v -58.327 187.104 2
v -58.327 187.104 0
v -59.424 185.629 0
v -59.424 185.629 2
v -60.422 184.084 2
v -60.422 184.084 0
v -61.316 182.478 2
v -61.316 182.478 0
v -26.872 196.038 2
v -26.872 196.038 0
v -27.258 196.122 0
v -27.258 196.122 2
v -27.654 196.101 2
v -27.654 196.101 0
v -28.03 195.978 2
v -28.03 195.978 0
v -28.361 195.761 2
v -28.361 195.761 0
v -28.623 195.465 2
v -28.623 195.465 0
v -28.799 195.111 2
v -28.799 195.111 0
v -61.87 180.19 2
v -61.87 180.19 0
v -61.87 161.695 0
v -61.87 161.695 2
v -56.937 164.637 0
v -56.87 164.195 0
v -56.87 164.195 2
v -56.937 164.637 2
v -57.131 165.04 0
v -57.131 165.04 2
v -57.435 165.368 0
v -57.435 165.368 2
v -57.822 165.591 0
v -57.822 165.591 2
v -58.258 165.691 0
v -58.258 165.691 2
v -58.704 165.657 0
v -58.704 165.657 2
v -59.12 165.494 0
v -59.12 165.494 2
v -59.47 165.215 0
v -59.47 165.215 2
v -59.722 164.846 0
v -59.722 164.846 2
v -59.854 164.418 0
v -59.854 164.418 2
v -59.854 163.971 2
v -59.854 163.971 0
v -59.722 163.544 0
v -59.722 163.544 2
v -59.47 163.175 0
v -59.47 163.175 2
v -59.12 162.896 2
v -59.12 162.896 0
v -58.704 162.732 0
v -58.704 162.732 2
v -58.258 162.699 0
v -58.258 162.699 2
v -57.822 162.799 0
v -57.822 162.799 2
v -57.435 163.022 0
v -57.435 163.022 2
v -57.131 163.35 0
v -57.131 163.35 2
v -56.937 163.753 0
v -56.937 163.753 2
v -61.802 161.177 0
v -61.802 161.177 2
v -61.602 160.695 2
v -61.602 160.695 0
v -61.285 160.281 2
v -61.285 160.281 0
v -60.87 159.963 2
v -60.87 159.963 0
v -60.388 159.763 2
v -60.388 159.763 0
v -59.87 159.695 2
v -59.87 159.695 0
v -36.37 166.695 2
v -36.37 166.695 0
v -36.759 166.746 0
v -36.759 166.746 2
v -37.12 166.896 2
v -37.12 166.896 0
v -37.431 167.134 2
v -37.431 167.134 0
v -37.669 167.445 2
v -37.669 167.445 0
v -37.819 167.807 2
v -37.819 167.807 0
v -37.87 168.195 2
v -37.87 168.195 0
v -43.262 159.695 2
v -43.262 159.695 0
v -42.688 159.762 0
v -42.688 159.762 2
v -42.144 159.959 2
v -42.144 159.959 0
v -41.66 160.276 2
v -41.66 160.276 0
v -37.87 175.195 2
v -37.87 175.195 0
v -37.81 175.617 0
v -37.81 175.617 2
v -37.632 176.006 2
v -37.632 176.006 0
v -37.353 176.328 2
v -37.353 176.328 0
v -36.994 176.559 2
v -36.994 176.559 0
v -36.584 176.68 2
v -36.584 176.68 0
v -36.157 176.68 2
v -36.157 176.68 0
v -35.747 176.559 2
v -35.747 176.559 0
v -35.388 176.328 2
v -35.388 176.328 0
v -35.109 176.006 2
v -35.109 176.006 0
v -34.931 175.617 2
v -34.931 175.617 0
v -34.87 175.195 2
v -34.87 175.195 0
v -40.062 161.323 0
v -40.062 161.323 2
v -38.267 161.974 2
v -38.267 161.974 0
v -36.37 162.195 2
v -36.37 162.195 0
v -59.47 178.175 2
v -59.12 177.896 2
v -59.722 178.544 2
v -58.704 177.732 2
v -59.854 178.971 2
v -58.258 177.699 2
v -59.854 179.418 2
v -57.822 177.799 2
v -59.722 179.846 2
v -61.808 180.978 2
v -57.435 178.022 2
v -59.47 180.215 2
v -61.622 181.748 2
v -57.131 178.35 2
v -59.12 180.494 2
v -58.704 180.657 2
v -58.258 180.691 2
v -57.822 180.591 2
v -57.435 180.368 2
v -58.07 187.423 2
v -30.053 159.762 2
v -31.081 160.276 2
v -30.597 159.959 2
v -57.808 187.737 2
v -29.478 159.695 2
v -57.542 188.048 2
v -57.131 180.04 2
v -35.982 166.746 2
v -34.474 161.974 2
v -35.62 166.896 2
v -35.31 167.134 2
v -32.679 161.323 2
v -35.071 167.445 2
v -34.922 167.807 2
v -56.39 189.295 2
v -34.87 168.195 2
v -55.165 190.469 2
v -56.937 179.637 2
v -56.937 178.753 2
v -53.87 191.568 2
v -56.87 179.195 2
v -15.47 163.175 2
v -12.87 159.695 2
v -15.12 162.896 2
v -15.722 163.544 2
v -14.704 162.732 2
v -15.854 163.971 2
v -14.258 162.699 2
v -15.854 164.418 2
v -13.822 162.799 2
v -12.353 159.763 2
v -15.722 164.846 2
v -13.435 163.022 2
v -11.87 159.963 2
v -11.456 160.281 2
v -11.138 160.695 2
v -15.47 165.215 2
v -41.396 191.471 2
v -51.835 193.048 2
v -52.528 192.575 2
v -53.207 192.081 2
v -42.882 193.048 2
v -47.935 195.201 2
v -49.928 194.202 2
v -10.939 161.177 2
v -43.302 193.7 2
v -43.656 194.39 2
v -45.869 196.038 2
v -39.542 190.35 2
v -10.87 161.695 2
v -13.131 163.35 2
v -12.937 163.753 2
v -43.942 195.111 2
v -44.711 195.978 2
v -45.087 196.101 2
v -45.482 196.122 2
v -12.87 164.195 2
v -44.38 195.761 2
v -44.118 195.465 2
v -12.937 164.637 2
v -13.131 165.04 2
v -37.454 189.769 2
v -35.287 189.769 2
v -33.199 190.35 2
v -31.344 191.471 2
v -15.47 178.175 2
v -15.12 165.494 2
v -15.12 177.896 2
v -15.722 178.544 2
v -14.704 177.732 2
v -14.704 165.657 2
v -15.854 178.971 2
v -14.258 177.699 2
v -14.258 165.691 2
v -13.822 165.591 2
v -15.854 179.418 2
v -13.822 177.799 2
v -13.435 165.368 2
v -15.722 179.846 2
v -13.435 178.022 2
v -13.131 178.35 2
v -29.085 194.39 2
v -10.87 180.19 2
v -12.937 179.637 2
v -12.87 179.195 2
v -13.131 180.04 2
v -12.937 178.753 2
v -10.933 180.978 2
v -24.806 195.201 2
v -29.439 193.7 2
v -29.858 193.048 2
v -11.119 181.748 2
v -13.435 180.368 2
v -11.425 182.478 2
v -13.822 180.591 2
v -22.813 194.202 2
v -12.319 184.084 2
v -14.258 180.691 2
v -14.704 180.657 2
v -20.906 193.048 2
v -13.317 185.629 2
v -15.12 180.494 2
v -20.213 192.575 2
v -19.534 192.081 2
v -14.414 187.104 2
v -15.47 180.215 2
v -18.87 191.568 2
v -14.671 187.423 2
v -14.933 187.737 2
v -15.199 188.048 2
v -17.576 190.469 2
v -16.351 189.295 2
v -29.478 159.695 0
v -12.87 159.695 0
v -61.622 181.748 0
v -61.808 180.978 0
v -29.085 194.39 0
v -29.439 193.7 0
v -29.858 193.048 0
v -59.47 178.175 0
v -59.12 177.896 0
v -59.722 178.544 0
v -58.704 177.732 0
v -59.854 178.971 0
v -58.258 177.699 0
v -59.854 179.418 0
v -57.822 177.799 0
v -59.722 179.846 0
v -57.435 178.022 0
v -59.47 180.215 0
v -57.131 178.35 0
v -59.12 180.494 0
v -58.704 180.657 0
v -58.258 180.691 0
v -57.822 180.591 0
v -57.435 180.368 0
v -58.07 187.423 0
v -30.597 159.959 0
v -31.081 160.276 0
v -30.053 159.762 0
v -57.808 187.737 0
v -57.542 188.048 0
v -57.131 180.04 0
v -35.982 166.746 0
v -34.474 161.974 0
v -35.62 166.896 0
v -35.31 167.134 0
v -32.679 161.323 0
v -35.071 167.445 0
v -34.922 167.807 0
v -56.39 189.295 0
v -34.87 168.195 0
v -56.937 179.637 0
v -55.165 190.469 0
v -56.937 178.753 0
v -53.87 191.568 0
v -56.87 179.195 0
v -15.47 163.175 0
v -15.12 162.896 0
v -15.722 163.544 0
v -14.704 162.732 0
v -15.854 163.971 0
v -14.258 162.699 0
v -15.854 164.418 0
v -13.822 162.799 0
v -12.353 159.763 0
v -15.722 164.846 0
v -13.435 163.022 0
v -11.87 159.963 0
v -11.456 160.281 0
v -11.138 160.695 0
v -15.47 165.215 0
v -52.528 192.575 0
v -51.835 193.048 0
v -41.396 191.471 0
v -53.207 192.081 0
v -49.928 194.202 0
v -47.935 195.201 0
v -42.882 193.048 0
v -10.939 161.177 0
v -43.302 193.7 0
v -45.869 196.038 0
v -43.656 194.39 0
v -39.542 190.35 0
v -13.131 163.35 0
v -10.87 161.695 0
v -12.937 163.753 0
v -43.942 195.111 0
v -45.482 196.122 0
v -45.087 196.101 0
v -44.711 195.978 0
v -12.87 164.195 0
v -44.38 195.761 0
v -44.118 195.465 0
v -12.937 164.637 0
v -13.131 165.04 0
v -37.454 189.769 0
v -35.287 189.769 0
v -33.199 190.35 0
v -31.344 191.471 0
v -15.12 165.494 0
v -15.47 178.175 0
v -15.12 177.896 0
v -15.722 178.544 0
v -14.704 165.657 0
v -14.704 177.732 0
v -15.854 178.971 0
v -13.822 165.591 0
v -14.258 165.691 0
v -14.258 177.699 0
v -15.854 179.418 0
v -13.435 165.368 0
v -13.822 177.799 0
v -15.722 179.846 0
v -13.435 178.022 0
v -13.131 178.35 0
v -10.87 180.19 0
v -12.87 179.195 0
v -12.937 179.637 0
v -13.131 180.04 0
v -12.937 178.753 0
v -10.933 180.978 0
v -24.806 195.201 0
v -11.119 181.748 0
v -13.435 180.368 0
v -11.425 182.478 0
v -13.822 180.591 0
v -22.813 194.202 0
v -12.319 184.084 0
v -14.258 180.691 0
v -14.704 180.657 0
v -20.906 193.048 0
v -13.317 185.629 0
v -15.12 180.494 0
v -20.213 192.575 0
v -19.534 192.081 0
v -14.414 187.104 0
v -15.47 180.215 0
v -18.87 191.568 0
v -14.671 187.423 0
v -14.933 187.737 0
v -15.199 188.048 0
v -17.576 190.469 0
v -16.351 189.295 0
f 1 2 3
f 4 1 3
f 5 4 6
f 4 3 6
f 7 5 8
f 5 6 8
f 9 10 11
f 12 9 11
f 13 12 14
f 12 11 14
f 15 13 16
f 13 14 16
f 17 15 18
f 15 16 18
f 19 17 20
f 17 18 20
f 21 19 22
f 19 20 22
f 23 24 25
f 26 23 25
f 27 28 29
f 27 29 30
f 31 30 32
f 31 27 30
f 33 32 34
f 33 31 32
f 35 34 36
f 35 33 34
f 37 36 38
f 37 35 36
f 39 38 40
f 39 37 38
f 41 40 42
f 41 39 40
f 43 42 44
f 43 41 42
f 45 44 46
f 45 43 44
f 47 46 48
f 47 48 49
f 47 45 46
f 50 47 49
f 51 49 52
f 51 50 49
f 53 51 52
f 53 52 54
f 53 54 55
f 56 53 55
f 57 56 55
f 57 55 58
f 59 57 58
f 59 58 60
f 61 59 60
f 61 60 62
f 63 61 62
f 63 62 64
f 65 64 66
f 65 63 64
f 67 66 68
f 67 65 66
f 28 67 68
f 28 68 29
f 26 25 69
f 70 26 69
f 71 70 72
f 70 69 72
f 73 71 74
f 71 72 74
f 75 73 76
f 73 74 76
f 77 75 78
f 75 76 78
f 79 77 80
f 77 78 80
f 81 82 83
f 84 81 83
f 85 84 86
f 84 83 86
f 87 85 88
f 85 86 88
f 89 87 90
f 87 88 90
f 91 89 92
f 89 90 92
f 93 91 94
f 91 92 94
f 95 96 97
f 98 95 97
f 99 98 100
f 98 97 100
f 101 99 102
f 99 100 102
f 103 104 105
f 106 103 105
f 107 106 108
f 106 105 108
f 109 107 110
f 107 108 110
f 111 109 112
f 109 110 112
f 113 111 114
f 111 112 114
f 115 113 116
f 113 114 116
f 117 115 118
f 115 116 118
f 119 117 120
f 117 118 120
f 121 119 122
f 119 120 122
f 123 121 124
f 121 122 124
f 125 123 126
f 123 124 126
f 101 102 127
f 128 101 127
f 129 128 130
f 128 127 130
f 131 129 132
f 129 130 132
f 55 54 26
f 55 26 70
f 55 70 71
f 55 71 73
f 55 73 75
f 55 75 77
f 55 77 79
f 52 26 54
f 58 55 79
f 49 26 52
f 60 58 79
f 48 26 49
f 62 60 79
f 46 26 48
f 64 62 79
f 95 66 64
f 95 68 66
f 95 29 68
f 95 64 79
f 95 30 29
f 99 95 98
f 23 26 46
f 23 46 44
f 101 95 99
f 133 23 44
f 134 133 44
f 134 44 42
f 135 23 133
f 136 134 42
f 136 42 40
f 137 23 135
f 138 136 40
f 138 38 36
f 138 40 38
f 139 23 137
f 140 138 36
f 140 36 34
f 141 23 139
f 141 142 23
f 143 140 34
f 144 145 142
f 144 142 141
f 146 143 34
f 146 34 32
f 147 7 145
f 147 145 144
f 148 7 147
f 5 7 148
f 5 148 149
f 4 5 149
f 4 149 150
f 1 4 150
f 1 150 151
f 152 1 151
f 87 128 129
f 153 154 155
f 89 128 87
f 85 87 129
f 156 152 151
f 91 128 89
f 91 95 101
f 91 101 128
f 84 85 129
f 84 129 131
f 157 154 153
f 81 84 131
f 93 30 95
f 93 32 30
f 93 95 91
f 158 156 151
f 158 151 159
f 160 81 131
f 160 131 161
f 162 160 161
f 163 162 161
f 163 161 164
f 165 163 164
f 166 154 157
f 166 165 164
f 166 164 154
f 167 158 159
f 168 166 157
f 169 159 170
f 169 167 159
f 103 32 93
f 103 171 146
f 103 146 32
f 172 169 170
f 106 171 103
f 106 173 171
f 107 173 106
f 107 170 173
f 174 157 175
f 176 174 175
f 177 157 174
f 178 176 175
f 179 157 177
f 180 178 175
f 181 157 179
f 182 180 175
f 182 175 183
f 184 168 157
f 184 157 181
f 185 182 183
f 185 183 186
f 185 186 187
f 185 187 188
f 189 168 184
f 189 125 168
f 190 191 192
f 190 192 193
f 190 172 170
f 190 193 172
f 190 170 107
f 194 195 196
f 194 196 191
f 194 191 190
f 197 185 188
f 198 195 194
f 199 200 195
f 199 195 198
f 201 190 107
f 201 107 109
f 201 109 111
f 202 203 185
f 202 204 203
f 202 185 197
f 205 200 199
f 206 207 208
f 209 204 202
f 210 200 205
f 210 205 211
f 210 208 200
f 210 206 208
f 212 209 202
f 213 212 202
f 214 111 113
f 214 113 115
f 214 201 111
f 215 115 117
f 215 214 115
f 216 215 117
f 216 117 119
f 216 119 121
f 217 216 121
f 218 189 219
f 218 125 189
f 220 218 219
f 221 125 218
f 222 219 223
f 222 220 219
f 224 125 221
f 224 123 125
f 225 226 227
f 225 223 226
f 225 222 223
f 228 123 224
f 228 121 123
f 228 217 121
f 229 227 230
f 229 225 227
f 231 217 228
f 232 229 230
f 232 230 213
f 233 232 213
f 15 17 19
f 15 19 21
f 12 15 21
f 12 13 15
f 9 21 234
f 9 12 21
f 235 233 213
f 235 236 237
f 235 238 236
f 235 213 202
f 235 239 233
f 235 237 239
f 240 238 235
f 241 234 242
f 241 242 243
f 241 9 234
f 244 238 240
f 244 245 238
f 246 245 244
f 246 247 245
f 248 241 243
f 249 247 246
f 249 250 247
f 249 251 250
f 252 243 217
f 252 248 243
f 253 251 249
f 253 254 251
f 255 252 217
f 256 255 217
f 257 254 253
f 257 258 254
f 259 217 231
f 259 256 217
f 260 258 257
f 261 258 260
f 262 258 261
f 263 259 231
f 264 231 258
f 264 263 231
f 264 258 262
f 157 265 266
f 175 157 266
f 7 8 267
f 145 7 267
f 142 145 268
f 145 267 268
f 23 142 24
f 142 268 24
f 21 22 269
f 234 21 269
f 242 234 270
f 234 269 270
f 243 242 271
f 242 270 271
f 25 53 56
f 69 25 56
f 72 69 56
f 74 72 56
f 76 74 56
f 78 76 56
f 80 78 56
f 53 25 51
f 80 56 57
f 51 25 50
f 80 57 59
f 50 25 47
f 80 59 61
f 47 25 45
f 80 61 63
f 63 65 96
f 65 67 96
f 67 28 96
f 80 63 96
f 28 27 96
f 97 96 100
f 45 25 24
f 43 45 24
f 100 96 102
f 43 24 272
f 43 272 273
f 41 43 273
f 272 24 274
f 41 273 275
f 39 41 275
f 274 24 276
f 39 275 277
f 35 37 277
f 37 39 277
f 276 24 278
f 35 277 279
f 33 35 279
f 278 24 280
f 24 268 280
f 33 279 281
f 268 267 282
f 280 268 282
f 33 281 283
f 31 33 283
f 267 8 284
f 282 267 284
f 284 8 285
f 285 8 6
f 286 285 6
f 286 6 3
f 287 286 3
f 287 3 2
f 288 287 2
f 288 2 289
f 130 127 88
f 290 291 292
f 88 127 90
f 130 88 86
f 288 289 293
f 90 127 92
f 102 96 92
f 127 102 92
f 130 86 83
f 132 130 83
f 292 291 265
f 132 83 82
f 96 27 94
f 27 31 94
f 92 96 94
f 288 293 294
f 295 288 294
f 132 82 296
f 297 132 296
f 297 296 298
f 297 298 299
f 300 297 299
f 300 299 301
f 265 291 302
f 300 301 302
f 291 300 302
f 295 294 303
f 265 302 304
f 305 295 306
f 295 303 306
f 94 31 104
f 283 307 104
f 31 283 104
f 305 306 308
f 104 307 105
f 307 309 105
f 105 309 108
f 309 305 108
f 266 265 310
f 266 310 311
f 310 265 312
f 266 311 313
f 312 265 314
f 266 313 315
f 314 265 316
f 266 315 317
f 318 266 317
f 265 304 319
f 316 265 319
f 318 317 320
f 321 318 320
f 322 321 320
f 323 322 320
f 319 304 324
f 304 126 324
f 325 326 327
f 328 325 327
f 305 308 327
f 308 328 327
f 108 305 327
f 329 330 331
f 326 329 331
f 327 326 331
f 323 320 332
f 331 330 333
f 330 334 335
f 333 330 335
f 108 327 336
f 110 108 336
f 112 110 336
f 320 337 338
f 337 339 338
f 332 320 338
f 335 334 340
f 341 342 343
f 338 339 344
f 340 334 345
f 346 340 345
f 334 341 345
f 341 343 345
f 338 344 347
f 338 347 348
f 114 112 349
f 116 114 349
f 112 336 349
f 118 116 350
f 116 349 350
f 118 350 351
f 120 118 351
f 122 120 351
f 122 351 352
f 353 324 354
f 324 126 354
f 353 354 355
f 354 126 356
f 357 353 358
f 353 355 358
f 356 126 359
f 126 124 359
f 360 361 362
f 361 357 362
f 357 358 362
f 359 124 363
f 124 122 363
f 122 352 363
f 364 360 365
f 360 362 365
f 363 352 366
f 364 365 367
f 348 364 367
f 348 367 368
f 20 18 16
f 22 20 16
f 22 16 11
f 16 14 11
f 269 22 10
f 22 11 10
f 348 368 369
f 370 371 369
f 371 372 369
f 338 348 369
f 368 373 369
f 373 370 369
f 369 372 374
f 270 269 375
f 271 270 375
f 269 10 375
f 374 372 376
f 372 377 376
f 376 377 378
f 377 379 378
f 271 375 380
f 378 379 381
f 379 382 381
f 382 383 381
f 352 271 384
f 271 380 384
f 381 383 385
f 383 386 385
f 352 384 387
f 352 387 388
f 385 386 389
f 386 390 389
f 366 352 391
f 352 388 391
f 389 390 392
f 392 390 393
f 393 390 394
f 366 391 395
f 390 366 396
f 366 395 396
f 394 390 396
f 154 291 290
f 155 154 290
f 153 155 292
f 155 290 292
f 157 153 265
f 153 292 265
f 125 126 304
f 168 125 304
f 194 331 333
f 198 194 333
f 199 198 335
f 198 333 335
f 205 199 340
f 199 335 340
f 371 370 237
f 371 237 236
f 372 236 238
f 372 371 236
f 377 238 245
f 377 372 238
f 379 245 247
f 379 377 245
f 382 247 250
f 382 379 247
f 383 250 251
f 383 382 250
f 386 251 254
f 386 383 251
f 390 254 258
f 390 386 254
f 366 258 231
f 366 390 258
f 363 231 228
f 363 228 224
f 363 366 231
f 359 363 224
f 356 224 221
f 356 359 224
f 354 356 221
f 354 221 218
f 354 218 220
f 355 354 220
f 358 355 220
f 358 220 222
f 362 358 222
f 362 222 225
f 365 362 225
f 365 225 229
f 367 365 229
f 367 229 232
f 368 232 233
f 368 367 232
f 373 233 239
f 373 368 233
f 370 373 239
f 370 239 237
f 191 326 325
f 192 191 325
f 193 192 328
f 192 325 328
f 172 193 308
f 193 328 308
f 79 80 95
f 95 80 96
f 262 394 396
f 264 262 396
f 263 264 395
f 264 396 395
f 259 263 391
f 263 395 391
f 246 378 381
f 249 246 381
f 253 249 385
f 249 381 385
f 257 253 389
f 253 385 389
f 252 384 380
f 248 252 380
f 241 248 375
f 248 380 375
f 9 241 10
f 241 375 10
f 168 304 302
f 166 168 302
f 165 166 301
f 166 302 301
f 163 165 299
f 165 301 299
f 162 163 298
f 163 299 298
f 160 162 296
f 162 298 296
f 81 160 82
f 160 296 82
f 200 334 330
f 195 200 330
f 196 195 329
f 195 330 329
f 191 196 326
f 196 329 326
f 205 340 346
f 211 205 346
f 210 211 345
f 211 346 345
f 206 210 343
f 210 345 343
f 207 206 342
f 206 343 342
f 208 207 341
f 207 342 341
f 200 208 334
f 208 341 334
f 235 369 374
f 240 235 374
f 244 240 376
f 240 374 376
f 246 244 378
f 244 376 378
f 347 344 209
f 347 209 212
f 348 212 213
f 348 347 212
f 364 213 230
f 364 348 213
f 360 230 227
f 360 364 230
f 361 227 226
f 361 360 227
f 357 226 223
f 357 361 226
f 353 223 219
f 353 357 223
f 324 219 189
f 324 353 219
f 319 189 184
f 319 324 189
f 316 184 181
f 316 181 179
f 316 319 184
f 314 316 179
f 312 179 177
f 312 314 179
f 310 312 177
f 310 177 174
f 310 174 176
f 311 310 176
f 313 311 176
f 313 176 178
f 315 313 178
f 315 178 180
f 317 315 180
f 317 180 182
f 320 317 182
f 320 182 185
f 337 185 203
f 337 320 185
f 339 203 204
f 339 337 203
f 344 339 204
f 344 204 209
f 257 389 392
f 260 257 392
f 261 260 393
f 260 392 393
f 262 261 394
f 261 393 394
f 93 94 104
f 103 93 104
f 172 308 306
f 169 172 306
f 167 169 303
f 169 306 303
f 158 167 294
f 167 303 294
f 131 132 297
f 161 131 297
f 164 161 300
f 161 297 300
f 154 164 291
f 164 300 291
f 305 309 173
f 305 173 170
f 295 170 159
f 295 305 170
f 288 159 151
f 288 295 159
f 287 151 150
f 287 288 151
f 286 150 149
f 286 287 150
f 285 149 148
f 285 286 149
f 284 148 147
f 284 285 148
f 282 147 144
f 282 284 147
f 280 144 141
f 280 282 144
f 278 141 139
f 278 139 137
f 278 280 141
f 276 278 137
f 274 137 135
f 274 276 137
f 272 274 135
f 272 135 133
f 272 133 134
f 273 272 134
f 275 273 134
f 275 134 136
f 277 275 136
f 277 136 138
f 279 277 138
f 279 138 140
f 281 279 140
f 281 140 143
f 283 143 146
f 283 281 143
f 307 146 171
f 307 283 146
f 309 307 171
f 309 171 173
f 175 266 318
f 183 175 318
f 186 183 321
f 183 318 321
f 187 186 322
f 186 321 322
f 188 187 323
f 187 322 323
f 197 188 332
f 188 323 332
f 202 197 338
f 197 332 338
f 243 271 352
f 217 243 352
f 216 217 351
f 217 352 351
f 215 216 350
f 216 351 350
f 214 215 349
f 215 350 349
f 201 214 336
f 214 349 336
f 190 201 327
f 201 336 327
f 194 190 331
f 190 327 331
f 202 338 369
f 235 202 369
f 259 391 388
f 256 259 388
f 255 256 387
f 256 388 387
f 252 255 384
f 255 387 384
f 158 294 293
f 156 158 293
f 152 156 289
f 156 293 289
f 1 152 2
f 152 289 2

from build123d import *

# Parameters (mm, degrees)
F0_R     = 1.5
F1_DEPTH = 2


# Not quite as in the source:
# - a feature names something its author has since deleted; it is built from what else it names


with BuildPart() as f1:
    # F0 (on Top) → F1 (new body)
    with BuildSketch(Plane.XY):
        with BuildLine():
            Line((-61.8704294452, 175.1948396463), (-53.8704294452, 175.1948396463))
            Line((-53.8704294452, 175.1948396463), (-53.8704294452, 185.547974161))
            ThreePointArc((-53.8704294452, 185.547974161), (-57.1946545112, 183.1877510697), (-58.3269518777, 187.1042581875))
            ThreePointArc((-58.3269518777, 187.1042581875), (-59.9354051762, 184.8644644288), (-61.3162125777, 182.4775901096))
            ThreePointArc((-61.3162125777, 182.4775901096), (-61.7299003867, 181.366665728), (-61.8704294452, 180.1895751756))
            Line((-61.8704294452, 180.1895751756), (-61.8704294452, 175.1948396463))
        make_face()
        with Locations((-58.3704294452, 179.1948396463)):
            Circle(F0_R, mode=Mode.SUBTRACT)
        with BuildLine():
            ThreePointArc((-58.3269518777, 187.1042581875), (-57.1946545112, 183.1877510697), (-53.8704294452, 185.547974161))
            ThreePointArc((-53.8704294452, 185.547974161), (-54.6026624922, 187.315741114), (-56.3704294452, 188.047974161))
            ThreePointArc((-56.3704294452, 188.047974161), (-57.4565440648, 187.7997190473), (-58.3269518777, 187.1042581875))
        make_face()
        with BuildLine():
            Line((-18.8704294452, 175.1948396463), (-10.8704294452, 175.1948396463))
            Line((-10.8704294452, 175.1948396463), (-10.8704294452, 180.1895751756))
            ThreePointArc((-10.8704294452, 180.1895751756), (-11.0109585037, 181.366665728), (-11.4246463127, 182.4775901096))
            ThreePointArc((-11.4246463127, 182.4775901096), (-12.8054541473, 184.8644650992), (-14.4139080064, 187.1042594368))
            ThreePointArc((-14.4139080064, 187.1042594368), (-14.010206617, 186.3721999805), (-13.8704294452, 185.547974161))
            ThreePointArc((-13.8704294452, 185.547974161), (-16.3704294452, 183.047974161), (-18.8704294452, 185.547974161))
            Line((-18.8704294452, 185.547974161), (-18.8704294452, 175.1948396463))
        make_face()
        with Locations((-14.3704294452, 179.1948396463)):
            Circle(F0_R, mode=Mode.SUBTRACT)
        with BuildLine():
            ThreePointArc((-16.3704294452, 188.047974161), (-18.1381963982, 187.315741114), (-18.8704294452, 185.547974161))
            ThreePointArc((-18.8704294452, 185.547974161), (-16.3704294452, 183.047974161), (-13.8704294452, 185.547974161))
            ThreePointArc((-13.8704294452, 185.547974161), (-14.010206617, 186.3721999805), (-14.4139080064, 187.1042594368))
            ThreePointArc((-14.4139080064, 187.1042594368), (-15.2843155445, 187.7997193941), (-16.3704294452, 188.047974161))
        make_face()
        with BuildLine():
            Line((-36.3704294452, 166.6948396463), (-36.3704294452, 165.1948396463))
            Line((-36.3704294452, 165.1948396463), (-23.8704294452, 165.1948396463))
            ThreePointArc((-23.8704294452, 165.1948396463), (-20.3348955393, 166.6593057403), (-18.8704294452, 170.1948396463))
            Line((-18.8704294452, 170.1948396463), (-18.8704294452, 175.1948396463))
            Line((-18.8704294452, 175.1948396463), (-34.8704294452, 175.1948396463))
            Line((-34.8704294452, 175.1948396463), (-34.8704294452, 168.1948396463))
            ThreePointArc((-34.8704294452, 168.1948396463), (-35.3097692734, 167.1341794745), (-36.3704294452, 166.6948396463))
        make_face()
        with BuildLine():
            Line((-48.8704294452, 165.1948396463), (-36.3704294452, 165.1948396463))
            Line((-36.3704294452, 165.1948396463), (-36.3704294452, 166.6948396463))
            ThreePointArc((-36.3704294452, 166.6948396463), (-37.431089617, 167.1341794745), (-37.8704294452, 168.1948396463))
            Line((-37.8704294452, 168.1948396463), (-37.8704294452, 175.1948396463))
            Line((-37.8704294452, 175.1948396463), (-53.8704294452, 175.1948396463))
            Line((-53.8704294452, 175.1948396463), (-53.8704294452, 170.1948396463))
            ThreePointArc((-53.8704294452, 170.1948396463), (-52.4059633511, 166.6593057403), (-48.8704294452, 165.1948396463))
        make_face()
        with BuildLine():
            Line((-34.8704294452, 175.1948396463), (-18.8704294452, 175.1948396463))
            Line((-18.8704294452, 175.1948396463), (-18.8704294452, 185.547974161))
            Line((-18.8704294452, 185.547974161), (-18.8704294452, 188.047974161))
            Line((-18.8704294452, 188.047974161), (-53.8704294452, 188.047974161))
            Line((-53.8704294452, 188.047974161), (-53.8704294452, 185.547974161))
            Line((-53.8704294452, 185.547974161), (-53.8704294452, 175.1948396463))
            Line((-53.8704294452, 175.1948396463), (-37.8704294452, 175.1948396463))
            ThreePointArc((-37.8704294452, 175.1948396463), (-36.3704294452, 176.6948396463), (-34.8704294452, 175.1948396463))
        make_face()
        with BuildLine():
            ThreePointArc((-41.6596574736, 160.2762349793), (-39.1836561071, 161.7003703018), (-36.3704294452, 162.1948396463))
            Line((-36.3704294452, 162.1948396463), (-36.3704294452, 165.1948396463))
            Line((-36.3704294452, 165.1948396463), (-48.8704294452, 165.1948396463))
            ThreePointArc((-48.8704294452, 165.1948396463), (-52.4059633511, 166.6593057403), (-53.8704294452, 170.1948396463))
            Line((-53.8704294452, 170.1948396463), (-53.8704294452, 175.1948396463))
            Line((-53.8704294452, 175.1948396463), (-61.8704294452, 175.1948396463))
            Line((-61.8704294452, 175.1948396463), (-61.8704294452, 161.6948396463))
            ThreePointArc((-61.8704294452, 161.6948396463), (-61.2846430076, 160.2806260839), (-59.8704294452, 159.6948396463))
            Line((-59.8704294452, 159.6948396463), (-43.2624538212, 159.6948396463))
            ThreePointArc((-43.2624538212, 159.6948396463), (-45.0302207742, 163.9626065992), (-40.7624538212, 162.1948396463))
            ThreePointArc((-40.7624538212, 162.1948396463), (-40.997835656, 161.13582852), (-41.6596574736, 160.2762349793))
        make_face()
        with Locations((-58.3704294452, 164.1948396463)):
            Circle(F0_R, mode=Mode.SUBTRACT)
        with BuildLine():
            ThreePointArc((-43.2624538212, 159.6948396463), (-42.4099609085, 159.8446788361), (-41.6596574736, 160.2762349793))
            ThreePointArc((-41.6596574736, 160.2762349793), (-40.997835656, 161.13582852), (-40.7624538212, 162.1948396463))
            ThreePointArc((-40.7624538212, 162.1948396463), (-45.0302207742, 163.9626065992), (-43.2624538212, 159.6948396463))
        make_face()
        with BuildLine():
            ThreePointArc((-56.3704294452, 188.047974161), (-54.6026624922, 187.315741114), (-53.8704294452, 185.547974161))
            Line((-53.8704294452, 185.547974161), (-53.8704294452, 188.047974161))
            Line((-53.8704294452, 188.047974161), (-56.3704294452, 188.047974161))
        make_face()
        with BuildLine():
            Line((-18.8704294452, 188.047974161), (-18.8704294452, 185.547974161))
            ThreePointArc((-18.8704294452, 185.547974161), (-18.1381963982, 187.315741114), (-16.3704294452, 188.047974161))
            Line((-16.3704294452, 188.047974161), (-18.8704294452, 188.047974161))
        make_face()
        with BuildLine():
            ThreePointArc((-26.9784050691, 162.1948396463), (-27.7106381162, 160.4270726933), (-29.4784050691, 159.6948396463))
            Line((-29.4784050691, 159.6948396463), (-12.8704294452, 159.6948396463))
            ThreePointArc((-12.8704294452, 159.6948396463), (-11.4562158828, 160.2806260839), (-10.8704294452, 161.6948396463))
            Line((-10.8704294452, 161.6948396463), (-10.8704294452, 175.1948396463))
            Line((-10.8704294452, 175.1948396463), (-18.8704294452, 175.1948396463))
            Line((-18.8704294452, 175.1948396463), (-18.8704294452, 170.1948396463))
            ThreePointArc((-18.8704294452, 170.1948396463), (-20.3348955393, 166.6593057403), (-23.8704294452, 165.1948396463))
            Line((-23.8704294452, 165.1948396463), (-36.3704294452, 165.1948396463))
            Line((-36.3704294452, 165.1948396463), (-36.3704294452, 162.1948396463))
            ThreePointArc((-36.3704294452, 162.1948396463), (-33.557202708, 161.7003702745), (-31.0812012938, 160.2762348766))
            ThreePointArc((-31.0812012938, 160.2762348766), (-30.5374162679, 164.4594577776), (-26.9784050691, 162.1948396463))
        make_face()
        with Locations((-14.3704294452, 164.1948396463)):
            Circle(F0_R, mode=Mode.SUBTRACT)
        with BuildLine():
            ThreePointArc((-31.0812012938, 160.2762348766), (-30.3308979066, 159.8446788088), (-29.4784050691, 159.6948396463))
            ThreePointArc((-29.4784050691, 159.6948396463), (-27.7106381162, 160.4270726933), (-26.9784050691, 162.1948396463))
            ThreePointArc((-26.9784050691, 162.1948396463), (-30.5374162679, 164.4594577776), (-31.0812012938, 160.2762348766))
        make_face()
        with BuildLine():
            Line((-53.8704294452, 188.047974161), (-18.8704294452, 188.047974161))
            Line((-18.8704294452, 188.047974161), (-18.8704294452, 191.5679000418))
            ThreePointArc((-18.8704294452, 191.5679000418), (-19.871628172, 192.3307748764), (-20.9060372255, 193.047974161))
            Line((-20.9060372255, 193.047974161), (-29.8583912725, 193.047974161))
            ThreePointArc((-29.8583912725, 193.047974161), (-36.3704294452, 189.6948396463), (-42.8824676178, 193.047974161))
            Line((-42.8824676178, 193.047974161), (-51.8348216648, 193.047974161))
            ThreePointArc((-51.8348216648, 193.047974161), (-52.8692307184, 192.3307748764), (-53.8704294452, 191.5679000418))
            Line((-53.8704294452, 191.5679000418), (-53.8704294452, 188.047974161))
        make_face()
        with BuildLine():
            Line((-56.3704294452, 188.047974161), (-53.8704294452, 188.047974161))
            Line((-53.8704294452, 188.047974161), (-53.8704294452, 191.5679000418))
            ThreePointArc((-53.8704294452, 191.5679000418), (-55.7861337119, 189.8913117759), (-57.5419746752, 188.047974161))
            Line((-57.5419746752, 188.047974161), (-56.3704294452, 188.047974161))
        make_face()
        with BuildLine():
            Line((-18.8704294452, 191.5679000418), (-18.8704294452, 188.047974161))
            Line((-18.8704294452, 188.047974161), (-16.3704294452, 188.047974161))
            Line((-16.3704294452, 188.047974161), (-15.1988842152, 188.047974161))
            ThreePointArc((-15.1988842152, 188.047974161), (-16.9547251785, 189.8913117759), (-18.8704294452, 191.5679000418))
        make_face()
        with BuildLine():
            ThreePointArc((-58.3269518777, 187.1042581875), (-57.4565440648, 187.7997190473), (-56.3704294452, 188.047974161))
            Line((-56.3704294452, 188.047974161), (-57.5419746752, 188.047974161))
            ThreePointArc((-57.5419746752, 188.047974161), (-57.939625189, 187.5804098217), (-58.3269518777, 187.1042581875))
        make_face()
        with BuildLine():
            Line((-15.1988842152, 188.047974161), (-16.3704294452, 188.047974161))
            ThreePointArc((-16.3704294452, 188.047974161), (-15.2843155445, 187.7997193941), (-14.4139080064, 187.1042594368))
            ThreePointArc((-14.4139080064, 187.1042594368), (-14.8012342118, 187.5804104353), (-15.1988842152, 188.047974161))
        make_face()
        with BuildLine():
            Line((-29.8583912725, 193.047974161), (-20.9060372255, 193.047974161))
            ThreePointArc((-20.9060372255, 193.047974161), (-23.799669125, 194.7209543402), (-26.8717251154, 196.0379358287))
            ThreePointArc((-26.8717251154, 196.0379358287), (-26.1524301853, 195.489141652), (-25.8795767704, 194.6265228146))
            ThreePointArc((-25.8795767704, 194.6265228146), (-27.6251244235, 193.1467571743), (-28.7991852371, 195.1109934548))
            ThreePointArc((-28.7991852371, 195.1109934548), (-29.2536378362, 194.0408996913), (-29.8583912725, 193.047974161))
        make_face()
        with BuildLine():
            ThreePointArc((-25.8795767704, 194.6265228146), (-26.1524301853, 195.489141652), (-26.8717251154, 196.0379358287))
            ThreePointArc((-26.8717251154, 196.0379358287), (-28.0296772719, 195.97832507), (-28.7991852371, 195.1109934548))
            ThreePointArc((-28.7991852371, 195.1109934548), (-27.6251244235, 193.1467571743), (-25.8795767704, 194.6265228146))
        make_face()
        with BuildLine():
            ThreePointArc((-43.9416738286, 195.1109939684), (-44.7111817722, 195.978325144), (-45.8691335854, 196.037935897))
            ThreePointArc((-45.8691335854, 196.037935897), (-46.2239010399, 193.3993762875), (-43.86128212, 194.6265228146))
            ThreePointArc((-43.86128212, 194.6265228146), (-43.8815165242, 194.8720707354), (-43.9416738286, 195.1109939684))
        make_face()
        with BuildLine():
            ThreePointArc((-45.8691335854, 196.037935897), (-48.9411896753, 194.7209543853), (-51.8348216648, 193.047974161))
            Line((-51.8348216648, 193.047974161), (-42.8824676178, 193.047974161))
            ThreePointArc((-42.8824676178, 193.047974161), (-43.4872211781, 194.0408999327), (-43.9416738286, 195.1109939684))
            ThreePointArc((-43.9416738286, 195.1109939684), (-43.8815165242, 194.8720707354), (-43.86128212, 194.6265228146))
            ThreePointArc((-43.86128212, 194.6265228146), (-46.2239010399, 193.3993762875), (-45.8691335854, 196.037935897))
        make_face()
    extrude(amount=F1_DEPTH)


solid = f1.part
